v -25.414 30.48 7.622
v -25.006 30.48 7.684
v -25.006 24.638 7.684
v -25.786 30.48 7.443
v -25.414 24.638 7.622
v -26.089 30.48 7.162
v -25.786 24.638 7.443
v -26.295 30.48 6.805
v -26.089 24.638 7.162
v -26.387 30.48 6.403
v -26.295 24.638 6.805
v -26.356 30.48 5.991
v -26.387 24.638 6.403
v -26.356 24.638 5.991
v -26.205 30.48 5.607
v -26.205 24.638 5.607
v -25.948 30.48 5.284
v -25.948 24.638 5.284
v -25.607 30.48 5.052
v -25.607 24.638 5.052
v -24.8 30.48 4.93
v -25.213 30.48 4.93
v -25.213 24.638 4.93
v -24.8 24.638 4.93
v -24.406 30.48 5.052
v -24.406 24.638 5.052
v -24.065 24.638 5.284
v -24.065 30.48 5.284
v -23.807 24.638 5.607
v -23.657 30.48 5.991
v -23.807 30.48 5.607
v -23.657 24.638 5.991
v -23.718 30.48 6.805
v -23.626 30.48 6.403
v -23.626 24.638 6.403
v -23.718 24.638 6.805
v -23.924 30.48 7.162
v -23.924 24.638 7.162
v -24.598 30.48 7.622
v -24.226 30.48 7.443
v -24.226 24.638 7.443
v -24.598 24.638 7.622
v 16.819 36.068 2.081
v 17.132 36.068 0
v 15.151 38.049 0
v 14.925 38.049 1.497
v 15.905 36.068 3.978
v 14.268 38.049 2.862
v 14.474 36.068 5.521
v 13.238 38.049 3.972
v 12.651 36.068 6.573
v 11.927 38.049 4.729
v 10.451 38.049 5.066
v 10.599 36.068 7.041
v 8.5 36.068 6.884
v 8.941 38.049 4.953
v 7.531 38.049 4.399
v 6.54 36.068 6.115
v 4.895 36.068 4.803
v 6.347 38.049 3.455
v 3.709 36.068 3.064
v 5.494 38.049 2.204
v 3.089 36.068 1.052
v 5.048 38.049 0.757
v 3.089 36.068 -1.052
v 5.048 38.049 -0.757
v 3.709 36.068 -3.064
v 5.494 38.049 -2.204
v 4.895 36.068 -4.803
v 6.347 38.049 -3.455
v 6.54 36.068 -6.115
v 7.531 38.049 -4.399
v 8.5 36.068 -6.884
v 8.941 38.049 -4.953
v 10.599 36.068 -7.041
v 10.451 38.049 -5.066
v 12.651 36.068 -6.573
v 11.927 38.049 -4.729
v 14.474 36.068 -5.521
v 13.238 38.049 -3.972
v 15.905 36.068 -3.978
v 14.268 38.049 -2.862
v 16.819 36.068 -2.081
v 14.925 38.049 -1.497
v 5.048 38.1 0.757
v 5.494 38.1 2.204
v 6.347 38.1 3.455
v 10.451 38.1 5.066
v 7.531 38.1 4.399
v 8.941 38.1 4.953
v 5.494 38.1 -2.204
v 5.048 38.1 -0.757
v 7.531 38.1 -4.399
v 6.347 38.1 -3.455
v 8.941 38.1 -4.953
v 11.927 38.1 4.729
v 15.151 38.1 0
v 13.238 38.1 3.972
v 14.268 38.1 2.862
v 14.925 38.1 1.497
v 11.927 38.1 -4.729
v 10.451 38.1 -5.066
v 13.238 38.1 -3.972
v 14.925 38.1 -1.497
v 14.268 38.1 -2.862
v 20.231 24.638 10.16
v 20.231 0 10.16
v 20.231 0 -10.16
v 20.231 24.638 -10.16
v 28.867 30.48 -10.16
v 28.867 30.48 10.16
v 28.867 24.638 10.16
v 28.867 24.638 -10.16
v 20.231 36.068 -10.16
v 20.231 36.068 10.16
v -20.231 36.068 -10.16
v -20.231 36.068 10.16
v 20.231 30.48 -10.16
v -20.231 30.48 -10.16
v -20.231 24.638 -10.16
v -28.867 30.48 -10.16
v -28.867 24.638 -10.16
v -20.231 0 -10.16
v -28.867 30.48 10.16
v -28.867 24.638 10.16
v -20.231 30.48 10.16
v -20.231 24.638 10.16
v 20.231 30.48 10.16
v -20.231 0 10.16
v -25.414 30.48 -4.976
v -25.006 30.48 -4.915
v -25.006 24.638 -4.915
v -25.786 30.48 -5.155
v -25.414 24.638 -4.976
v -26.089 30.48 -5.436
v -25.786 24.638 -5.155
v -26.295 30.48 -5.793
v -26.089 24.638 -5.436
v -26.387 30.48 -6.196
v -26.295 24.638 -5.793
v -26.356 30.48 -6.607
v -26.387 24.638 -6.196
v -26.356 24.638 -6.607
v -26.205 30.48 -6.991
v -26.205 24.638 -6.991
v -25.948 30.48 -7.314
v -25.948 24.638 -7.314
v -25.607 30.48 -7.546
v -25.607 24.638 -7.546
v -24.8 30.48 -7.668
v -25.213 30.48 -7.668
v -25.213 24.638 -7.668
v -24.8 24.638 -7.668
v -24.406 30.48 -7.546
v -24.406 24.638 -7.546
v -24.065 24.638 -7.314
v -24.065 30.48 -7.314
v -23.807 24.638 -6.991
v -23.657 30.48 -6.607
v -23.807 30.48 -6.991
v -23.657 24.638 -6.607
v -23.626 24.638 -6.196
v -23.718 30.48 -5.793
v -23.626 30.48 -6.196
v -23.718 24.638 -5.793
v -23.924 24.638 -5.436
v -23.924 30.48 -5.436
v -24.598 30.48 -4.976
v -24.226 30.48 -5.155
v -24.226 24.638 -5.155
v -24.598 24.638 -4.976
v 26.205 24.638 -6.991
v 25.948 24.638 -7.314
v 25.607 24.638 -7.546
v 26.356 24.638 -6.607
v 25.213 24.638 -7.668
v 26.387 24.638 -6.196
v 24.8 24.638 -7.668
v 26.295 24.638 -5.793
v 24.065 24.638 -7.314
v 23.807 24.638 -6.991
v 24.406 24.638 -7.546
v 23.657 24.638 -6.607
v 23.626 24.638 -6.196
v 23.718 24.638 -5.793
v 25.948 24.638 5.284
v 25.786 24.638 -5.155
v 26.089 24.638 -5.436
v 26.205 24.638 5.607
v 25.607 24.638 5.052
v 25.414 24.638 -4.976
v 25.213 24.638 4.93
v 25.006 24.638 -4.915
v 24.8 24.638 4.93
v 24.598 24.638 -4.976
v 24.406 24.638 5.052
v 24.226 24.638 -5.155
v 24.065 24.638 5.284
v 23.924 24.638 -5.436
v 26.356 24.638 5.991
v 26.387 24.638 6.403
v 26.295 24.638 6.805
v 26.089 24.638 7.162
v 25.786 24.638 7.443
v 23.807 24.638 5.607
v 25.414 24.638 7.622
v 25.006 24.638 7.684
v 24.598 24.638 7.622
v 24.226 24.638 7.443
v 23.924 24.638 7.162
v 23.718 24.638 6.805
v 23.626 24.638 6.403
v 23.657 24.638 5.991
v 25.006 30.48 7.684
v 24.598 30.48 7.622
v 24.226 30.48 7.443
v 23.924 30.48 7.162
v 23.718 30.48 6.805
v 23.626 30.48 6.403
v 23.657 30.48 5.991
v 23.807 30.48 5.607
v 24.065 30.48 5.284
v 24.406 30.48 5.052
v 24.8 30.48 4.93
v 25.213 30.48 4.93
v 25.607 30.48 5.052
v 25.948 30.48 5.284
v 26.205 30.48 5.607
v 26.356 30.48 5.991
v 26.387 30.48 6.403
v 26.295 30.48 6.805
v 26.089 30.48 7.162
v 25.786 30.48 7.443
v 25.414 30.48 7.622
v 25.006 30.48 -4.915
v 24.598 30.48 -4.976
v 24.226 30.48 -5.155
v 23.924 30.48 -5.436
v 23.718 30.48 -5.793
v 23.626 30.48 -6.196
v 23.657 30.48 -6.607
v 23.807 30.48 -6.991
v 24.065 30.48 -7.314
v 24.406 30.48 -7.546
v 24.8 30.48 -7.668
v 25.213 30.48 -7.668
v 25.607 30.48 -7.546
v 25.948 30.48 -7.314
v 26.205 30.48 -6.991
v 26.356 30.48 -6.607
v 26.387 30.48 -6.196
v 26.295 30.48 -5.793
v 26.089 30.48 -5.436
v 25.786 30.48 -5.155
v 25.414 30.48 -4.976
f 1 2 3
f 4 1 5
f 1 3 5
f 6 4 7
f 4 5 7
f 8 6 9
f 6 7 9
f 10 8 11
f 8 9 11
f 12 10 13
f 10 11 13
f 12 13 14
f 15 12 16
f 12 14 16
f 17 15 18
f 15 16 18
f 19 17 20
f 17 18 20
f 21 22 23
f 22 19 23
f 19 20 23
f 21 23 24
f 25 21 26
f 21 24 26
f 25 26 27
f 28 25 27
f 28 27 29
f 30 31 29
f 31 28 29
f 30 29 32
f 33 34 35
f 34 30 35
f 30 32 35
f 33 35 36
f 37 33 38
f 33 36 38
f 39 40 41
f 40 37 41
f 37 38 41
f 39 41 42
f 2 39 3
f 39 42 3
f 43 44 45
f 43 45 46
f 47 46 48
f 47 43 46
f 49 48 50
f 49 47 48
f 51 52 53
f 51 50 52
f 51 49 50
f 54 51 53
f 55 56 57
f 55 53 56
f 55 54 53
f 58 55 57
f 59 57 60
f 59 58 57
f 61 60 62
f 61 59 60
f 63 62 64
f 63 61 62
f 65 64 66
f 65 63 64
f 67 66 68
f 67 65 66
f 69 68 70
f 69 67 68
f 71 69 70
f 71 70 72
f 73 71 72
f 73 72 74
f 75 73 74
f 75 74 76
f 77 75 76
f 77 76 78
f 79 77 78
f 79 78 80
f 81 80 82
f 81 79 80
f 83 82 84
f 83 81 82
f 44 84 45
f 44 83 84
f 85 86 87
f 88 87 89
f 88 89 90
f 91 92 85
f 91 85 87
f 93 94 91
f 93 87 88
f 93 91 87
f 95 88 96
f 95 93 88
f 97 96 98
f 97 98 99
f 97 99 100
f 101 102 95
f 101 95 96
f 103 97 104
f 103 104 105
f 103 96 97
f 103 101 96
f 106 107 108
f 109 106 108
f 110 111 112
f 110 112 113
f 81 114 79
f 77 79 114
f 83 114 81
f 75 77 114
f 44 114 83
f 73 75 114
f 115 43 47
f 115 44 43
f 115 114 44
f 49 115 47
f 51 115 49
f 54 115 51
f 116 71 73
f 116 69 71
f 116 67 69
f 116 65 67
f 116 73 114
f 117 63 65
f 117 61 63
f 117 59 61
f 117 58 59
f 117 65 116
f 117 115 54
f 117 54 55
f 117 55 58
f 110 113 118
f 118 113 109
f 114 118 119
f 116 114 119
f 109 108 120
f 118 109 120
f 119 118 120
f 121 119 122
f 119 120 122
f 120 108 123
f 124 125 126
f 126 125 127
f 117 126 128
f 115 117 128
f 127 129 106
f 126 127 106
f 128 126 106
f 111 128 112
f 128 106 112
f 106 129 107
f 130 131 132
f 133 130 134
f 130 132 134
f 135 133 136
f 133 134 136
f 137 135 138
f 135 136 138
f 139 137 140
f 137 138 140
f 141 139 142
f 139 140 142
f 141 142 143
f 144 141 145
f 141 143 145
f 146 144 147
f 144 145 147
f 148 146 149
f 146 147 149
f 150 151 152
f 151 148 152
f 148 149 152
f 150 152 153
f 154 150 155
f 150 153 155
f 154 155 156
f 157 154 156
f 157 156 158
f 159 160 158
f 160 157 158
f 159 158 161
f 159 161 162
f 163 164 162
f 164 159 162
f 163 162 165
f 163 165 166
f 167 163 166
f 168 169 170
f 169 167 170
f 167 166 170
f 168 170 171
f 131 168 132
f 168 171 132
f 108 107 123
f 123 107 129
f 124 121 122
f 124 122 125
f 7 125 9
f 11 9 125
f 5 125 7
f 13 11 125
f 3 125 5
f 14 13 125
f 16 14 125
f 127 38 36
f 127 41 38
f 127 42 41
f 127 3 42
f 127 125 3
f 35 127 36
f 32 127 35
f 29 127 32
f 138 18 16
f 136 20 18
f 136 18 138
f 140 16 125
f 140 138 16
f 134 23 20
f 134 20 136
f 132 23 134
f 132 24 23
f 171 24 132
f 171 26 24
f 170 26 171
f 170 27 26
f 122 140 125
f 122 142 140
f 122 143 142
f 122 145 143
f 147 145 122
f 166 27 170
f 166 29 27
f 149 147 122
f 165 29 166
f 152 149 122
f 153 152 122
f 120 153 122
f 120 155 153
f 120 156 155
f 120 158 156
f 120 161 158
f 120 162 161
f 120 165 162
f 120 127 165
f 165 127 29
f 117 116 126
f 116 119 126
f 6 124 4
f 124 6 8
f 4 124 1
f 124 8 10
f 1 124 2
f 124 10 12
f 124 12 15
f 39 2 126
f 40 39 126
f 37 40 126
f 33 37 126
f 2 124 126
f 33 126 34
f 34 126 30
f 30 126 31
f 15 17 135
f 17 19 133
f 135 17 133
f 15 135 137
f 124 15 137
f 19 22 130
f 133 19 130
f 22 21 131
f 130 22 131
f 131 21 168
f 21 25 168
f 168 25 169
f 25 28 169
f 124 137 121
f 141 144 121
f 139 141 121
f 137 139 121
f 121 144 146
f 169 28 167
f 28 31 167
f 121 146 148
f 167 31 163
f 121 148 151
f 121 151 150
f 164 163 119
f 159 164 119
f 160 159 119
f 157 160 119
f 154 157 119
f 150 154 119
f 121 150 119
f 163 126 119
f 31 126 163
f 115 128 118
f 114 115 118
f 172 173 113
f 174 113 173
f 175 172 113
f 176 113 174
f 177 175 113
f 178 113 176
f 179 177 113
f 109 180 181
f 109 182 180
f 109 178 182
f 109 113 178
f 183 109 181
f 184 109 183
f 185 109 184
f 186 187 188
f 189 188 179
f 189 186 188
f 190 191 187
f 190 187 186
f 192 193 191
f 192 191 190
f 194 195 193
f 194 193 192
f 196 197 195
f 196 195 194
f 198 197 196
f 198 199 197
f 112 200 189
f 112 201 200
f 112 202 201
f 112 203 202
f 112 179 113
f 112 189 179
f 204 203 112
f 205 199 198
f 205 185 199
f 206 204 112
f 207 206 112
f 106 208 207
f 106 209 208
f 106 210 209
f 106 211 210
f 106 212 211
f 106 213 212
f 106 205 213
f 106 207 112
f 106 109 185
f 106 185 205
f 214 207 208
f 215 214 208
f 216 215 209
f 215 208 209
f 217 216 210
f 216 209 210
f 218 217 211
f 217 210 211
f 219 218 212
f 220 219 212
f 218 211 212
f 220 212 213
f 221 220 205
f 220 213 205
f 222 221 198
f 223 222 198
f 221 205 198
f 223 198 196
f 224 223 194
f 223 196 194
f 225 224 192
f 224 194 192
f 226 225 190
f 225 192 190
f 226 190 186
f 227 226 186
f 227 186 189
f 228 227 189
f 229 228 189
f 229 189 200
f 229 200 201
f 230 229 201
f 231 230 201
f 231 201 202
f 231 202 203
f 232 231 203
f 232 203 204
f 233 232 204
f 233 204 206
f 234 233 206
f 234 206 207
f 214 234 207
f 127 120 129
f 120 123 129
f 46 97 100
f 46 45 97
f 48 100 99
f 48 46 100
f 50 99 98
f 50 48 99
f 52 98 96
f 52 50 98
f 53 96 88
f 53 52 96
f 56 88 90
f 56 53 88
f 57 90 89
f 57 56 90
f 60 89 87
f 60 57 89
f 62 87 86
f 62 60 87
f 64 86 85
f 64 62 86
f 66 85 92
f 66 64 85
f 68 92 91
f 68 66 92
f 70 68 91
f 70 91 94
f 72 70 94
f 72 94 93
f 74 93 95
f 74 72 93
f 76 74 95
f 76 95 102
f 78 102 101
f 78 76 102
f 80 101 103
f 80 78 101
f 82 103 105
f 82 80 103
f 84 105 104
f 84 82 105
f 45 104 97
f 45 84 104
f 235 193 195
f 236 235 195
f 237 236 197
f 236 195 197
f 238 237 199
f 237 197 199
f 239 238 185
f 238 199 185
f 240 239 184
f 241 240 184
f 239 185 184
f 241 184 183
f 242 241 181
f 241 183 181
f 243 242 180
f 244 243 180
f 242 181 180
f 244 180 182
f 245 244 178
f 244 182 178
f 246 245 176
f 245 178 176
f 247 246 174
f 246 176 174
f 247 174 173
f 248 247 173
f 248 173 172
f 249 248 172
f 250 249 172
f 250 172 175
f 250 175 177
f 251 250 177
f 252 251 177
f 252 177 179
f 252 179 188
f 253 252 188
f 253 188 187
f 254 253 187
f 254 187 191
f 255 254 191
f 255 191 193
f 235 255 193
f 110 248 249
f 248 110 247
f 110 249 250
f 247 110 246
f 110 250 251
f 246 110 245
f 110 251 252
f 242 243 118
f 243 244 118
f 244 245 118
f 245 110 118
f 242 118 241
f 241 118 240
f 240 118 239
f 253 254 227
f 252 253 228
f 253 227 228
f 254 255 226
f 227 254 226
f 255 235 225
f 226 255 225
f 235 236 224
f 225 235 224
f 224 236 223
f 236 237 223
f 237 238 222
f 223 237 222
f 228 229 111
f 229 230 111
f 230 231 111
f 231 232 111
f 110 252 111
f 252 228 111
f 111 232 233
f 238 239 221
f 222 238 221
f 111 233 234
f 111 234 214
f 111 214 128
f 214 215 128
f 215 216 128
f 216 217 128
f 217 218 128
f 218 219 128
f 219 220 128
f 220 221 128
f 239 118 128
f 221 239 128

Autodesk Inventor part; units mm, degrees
ref_plane "YZ Plane" through (0, 0, 0) normal (1, 0, 0) x (0, 1, 0)
ref_plane "XZ Plane" through (0, 0, 0) normal (0, 1, 0) x (-1, 0, 0)
ref_plane "XY Plane" through (0, 0, 0) normal (0, 0, 1) x (1, 0, 0)
sketch "Sketch1" plane through (0, 0, 0) normal (0, 1, 0) x (-1, 0, 0)
  line L0 (-20.2311, -10.16) -> (20.2311, -10.16)
  line L1 (20.2311, -10.16) -> (20.2311, 10.16)
  line L2 (20.2311, 10.16) -> (-20.2311, 10.16)
  line L3 (-20.2311, 10.16) -> (-20.2311, -10.16)
  line L4 (-20.2311, -10.16) -> (20.2311, 10.16) construction
  line L5 (20.2311, -10.16) -> (-20.2311, 10.16) construction
  point P0 (0, 0)
  dimension "d0" = 40.4622
  dimension "d1" = 20.32
extrude "Extrusion1" add sketch "Sketch1" along normal blind 36.068
sketch "Sketch2" plane through (0, 36.068, 0) normal (0, 1, 0) x (1, 0, 0)
  line L0 (-20.2311, -10.16) -> (20.2311, -10.16) projected
  line L1 (20.2311, -10.16) -> (20.2311, 10.16) projected
  circle A0 centre (10.0711, 0) radius 6.985
  circle A1 centre (10.0711, 0) radius 5.08
  point P0 (0, 0)
  dimension "d4" = 13.97
  dimension "d5" = 10.16
  dimension "d6" = 10.16
  dimension "d7" = 10.16
extrude "Extrusion2" add sketch "Sketch2" along normal blind 2.032 contours A1
chamfer "Chamfer1" distance 1.9812 angle 45 1 edges at (4.9911, 36.068, 0)
sketch "Sketch3" plane through (10.0711, 38.1, 0) normal (0, 1, 0) x (1, 0, 0)
  circle A0 centre (0, 0) radius 5.08 projected
  point P0 (-10.0711, 0)
ref_plane "Work Plane1" through (0, 38.1, 0) normal (1, 0, 0) x (0, 0, -1)
sketch "Sketch4" plane through (20.2311, 0, 10.16) normal (1, 0, 0) x (0, 0, -1)
  line L0 (20.32, 0) -> (20.32, 36.068) projected
  line L1 (0, 36.068) -> (20.32, 36.068)
  line L2 (20.32, 36.068) -> (20.32, 30.48)
  line L3 (20.32, 30.48) -> (0, 30.48)
  line L4 (0, 30.48) -> (0, 36.068)
  line L5 (0, 30.48) -> (20.32, 30.48)
  line L6 (20.32, 30.48) -> (20.32, 24.638)
  line L7 (20.32, 24.638) -> (0, 24.638)
  line L8 (0, 24.638) -> (0, 30.48)
  point P0 (10.16, 0)
  dimension "d14" = 5.588
  dimension "d16" = 5.842
extrude "Extrusion3" add sketch "Sketch4" along normal blind 8.636 contours L7 L8 L3 L0
sketch "Sketch5" plane through (20.2311, 30.48, 10.16) normal (0, 1, 0) x (1, 0, 0)
  line L0 (0, 0) -> (8.636, 0) projected
  line L1 (8.636, 20.32) -> (8.636, 0) projected
  line L2 (0, 20.32) -> (8.636, 20.32) projected
  point P0 (-20.2311, 10.16)
  point P1 (4.7752, 16.4592)
  point P2 (4.7752, 3.8608)
  dimension "d19" = 3.8608
  dimension "d20" = 3.8608
  dimension "d21" = 3.8608
  dimension "d22" = 3.8608
hole "Hole1" at (25.0063, 30.48, -6.2992) at (25.0063, 30.48, 6.2992) direction (0, -1, 0) diameter 2.7686 end through all
mirror "Mirror1" about plane through (0, 38.1, 0) normal (1, 0, 0) of "Extrusion3", "Hole1"
sketch "Sketch6" plane through (20.2311, 0, 10.16) normal (1, 0, 0) x (0, 0, -1)
  line L0 (20.32, 24.638) -> (0, 24.638) projected
  line L1 (0, 0) -> (0, 24.638) projected
  line L2 (0, 0) -> (20.32, 0) projected
  line L3 (20.32, 0) -> (20.32, 24.638) projected
  line L4 (5.7791, 2.54) -> (13.4355, 2.54)
  point P0 (10.16, 0)
  point P1 (10.16, 2.54)
  point P2 (10.922, 2.54)
  point P3 (9.398, 2.54)
  dimension "d30" = 0.762
  dimension "d32" = 0.762
  dimension "d33" = 0
  dimension "d34" = 2.54
equation "\"d32\" = d30"
properties material "Aluminum 6061"
